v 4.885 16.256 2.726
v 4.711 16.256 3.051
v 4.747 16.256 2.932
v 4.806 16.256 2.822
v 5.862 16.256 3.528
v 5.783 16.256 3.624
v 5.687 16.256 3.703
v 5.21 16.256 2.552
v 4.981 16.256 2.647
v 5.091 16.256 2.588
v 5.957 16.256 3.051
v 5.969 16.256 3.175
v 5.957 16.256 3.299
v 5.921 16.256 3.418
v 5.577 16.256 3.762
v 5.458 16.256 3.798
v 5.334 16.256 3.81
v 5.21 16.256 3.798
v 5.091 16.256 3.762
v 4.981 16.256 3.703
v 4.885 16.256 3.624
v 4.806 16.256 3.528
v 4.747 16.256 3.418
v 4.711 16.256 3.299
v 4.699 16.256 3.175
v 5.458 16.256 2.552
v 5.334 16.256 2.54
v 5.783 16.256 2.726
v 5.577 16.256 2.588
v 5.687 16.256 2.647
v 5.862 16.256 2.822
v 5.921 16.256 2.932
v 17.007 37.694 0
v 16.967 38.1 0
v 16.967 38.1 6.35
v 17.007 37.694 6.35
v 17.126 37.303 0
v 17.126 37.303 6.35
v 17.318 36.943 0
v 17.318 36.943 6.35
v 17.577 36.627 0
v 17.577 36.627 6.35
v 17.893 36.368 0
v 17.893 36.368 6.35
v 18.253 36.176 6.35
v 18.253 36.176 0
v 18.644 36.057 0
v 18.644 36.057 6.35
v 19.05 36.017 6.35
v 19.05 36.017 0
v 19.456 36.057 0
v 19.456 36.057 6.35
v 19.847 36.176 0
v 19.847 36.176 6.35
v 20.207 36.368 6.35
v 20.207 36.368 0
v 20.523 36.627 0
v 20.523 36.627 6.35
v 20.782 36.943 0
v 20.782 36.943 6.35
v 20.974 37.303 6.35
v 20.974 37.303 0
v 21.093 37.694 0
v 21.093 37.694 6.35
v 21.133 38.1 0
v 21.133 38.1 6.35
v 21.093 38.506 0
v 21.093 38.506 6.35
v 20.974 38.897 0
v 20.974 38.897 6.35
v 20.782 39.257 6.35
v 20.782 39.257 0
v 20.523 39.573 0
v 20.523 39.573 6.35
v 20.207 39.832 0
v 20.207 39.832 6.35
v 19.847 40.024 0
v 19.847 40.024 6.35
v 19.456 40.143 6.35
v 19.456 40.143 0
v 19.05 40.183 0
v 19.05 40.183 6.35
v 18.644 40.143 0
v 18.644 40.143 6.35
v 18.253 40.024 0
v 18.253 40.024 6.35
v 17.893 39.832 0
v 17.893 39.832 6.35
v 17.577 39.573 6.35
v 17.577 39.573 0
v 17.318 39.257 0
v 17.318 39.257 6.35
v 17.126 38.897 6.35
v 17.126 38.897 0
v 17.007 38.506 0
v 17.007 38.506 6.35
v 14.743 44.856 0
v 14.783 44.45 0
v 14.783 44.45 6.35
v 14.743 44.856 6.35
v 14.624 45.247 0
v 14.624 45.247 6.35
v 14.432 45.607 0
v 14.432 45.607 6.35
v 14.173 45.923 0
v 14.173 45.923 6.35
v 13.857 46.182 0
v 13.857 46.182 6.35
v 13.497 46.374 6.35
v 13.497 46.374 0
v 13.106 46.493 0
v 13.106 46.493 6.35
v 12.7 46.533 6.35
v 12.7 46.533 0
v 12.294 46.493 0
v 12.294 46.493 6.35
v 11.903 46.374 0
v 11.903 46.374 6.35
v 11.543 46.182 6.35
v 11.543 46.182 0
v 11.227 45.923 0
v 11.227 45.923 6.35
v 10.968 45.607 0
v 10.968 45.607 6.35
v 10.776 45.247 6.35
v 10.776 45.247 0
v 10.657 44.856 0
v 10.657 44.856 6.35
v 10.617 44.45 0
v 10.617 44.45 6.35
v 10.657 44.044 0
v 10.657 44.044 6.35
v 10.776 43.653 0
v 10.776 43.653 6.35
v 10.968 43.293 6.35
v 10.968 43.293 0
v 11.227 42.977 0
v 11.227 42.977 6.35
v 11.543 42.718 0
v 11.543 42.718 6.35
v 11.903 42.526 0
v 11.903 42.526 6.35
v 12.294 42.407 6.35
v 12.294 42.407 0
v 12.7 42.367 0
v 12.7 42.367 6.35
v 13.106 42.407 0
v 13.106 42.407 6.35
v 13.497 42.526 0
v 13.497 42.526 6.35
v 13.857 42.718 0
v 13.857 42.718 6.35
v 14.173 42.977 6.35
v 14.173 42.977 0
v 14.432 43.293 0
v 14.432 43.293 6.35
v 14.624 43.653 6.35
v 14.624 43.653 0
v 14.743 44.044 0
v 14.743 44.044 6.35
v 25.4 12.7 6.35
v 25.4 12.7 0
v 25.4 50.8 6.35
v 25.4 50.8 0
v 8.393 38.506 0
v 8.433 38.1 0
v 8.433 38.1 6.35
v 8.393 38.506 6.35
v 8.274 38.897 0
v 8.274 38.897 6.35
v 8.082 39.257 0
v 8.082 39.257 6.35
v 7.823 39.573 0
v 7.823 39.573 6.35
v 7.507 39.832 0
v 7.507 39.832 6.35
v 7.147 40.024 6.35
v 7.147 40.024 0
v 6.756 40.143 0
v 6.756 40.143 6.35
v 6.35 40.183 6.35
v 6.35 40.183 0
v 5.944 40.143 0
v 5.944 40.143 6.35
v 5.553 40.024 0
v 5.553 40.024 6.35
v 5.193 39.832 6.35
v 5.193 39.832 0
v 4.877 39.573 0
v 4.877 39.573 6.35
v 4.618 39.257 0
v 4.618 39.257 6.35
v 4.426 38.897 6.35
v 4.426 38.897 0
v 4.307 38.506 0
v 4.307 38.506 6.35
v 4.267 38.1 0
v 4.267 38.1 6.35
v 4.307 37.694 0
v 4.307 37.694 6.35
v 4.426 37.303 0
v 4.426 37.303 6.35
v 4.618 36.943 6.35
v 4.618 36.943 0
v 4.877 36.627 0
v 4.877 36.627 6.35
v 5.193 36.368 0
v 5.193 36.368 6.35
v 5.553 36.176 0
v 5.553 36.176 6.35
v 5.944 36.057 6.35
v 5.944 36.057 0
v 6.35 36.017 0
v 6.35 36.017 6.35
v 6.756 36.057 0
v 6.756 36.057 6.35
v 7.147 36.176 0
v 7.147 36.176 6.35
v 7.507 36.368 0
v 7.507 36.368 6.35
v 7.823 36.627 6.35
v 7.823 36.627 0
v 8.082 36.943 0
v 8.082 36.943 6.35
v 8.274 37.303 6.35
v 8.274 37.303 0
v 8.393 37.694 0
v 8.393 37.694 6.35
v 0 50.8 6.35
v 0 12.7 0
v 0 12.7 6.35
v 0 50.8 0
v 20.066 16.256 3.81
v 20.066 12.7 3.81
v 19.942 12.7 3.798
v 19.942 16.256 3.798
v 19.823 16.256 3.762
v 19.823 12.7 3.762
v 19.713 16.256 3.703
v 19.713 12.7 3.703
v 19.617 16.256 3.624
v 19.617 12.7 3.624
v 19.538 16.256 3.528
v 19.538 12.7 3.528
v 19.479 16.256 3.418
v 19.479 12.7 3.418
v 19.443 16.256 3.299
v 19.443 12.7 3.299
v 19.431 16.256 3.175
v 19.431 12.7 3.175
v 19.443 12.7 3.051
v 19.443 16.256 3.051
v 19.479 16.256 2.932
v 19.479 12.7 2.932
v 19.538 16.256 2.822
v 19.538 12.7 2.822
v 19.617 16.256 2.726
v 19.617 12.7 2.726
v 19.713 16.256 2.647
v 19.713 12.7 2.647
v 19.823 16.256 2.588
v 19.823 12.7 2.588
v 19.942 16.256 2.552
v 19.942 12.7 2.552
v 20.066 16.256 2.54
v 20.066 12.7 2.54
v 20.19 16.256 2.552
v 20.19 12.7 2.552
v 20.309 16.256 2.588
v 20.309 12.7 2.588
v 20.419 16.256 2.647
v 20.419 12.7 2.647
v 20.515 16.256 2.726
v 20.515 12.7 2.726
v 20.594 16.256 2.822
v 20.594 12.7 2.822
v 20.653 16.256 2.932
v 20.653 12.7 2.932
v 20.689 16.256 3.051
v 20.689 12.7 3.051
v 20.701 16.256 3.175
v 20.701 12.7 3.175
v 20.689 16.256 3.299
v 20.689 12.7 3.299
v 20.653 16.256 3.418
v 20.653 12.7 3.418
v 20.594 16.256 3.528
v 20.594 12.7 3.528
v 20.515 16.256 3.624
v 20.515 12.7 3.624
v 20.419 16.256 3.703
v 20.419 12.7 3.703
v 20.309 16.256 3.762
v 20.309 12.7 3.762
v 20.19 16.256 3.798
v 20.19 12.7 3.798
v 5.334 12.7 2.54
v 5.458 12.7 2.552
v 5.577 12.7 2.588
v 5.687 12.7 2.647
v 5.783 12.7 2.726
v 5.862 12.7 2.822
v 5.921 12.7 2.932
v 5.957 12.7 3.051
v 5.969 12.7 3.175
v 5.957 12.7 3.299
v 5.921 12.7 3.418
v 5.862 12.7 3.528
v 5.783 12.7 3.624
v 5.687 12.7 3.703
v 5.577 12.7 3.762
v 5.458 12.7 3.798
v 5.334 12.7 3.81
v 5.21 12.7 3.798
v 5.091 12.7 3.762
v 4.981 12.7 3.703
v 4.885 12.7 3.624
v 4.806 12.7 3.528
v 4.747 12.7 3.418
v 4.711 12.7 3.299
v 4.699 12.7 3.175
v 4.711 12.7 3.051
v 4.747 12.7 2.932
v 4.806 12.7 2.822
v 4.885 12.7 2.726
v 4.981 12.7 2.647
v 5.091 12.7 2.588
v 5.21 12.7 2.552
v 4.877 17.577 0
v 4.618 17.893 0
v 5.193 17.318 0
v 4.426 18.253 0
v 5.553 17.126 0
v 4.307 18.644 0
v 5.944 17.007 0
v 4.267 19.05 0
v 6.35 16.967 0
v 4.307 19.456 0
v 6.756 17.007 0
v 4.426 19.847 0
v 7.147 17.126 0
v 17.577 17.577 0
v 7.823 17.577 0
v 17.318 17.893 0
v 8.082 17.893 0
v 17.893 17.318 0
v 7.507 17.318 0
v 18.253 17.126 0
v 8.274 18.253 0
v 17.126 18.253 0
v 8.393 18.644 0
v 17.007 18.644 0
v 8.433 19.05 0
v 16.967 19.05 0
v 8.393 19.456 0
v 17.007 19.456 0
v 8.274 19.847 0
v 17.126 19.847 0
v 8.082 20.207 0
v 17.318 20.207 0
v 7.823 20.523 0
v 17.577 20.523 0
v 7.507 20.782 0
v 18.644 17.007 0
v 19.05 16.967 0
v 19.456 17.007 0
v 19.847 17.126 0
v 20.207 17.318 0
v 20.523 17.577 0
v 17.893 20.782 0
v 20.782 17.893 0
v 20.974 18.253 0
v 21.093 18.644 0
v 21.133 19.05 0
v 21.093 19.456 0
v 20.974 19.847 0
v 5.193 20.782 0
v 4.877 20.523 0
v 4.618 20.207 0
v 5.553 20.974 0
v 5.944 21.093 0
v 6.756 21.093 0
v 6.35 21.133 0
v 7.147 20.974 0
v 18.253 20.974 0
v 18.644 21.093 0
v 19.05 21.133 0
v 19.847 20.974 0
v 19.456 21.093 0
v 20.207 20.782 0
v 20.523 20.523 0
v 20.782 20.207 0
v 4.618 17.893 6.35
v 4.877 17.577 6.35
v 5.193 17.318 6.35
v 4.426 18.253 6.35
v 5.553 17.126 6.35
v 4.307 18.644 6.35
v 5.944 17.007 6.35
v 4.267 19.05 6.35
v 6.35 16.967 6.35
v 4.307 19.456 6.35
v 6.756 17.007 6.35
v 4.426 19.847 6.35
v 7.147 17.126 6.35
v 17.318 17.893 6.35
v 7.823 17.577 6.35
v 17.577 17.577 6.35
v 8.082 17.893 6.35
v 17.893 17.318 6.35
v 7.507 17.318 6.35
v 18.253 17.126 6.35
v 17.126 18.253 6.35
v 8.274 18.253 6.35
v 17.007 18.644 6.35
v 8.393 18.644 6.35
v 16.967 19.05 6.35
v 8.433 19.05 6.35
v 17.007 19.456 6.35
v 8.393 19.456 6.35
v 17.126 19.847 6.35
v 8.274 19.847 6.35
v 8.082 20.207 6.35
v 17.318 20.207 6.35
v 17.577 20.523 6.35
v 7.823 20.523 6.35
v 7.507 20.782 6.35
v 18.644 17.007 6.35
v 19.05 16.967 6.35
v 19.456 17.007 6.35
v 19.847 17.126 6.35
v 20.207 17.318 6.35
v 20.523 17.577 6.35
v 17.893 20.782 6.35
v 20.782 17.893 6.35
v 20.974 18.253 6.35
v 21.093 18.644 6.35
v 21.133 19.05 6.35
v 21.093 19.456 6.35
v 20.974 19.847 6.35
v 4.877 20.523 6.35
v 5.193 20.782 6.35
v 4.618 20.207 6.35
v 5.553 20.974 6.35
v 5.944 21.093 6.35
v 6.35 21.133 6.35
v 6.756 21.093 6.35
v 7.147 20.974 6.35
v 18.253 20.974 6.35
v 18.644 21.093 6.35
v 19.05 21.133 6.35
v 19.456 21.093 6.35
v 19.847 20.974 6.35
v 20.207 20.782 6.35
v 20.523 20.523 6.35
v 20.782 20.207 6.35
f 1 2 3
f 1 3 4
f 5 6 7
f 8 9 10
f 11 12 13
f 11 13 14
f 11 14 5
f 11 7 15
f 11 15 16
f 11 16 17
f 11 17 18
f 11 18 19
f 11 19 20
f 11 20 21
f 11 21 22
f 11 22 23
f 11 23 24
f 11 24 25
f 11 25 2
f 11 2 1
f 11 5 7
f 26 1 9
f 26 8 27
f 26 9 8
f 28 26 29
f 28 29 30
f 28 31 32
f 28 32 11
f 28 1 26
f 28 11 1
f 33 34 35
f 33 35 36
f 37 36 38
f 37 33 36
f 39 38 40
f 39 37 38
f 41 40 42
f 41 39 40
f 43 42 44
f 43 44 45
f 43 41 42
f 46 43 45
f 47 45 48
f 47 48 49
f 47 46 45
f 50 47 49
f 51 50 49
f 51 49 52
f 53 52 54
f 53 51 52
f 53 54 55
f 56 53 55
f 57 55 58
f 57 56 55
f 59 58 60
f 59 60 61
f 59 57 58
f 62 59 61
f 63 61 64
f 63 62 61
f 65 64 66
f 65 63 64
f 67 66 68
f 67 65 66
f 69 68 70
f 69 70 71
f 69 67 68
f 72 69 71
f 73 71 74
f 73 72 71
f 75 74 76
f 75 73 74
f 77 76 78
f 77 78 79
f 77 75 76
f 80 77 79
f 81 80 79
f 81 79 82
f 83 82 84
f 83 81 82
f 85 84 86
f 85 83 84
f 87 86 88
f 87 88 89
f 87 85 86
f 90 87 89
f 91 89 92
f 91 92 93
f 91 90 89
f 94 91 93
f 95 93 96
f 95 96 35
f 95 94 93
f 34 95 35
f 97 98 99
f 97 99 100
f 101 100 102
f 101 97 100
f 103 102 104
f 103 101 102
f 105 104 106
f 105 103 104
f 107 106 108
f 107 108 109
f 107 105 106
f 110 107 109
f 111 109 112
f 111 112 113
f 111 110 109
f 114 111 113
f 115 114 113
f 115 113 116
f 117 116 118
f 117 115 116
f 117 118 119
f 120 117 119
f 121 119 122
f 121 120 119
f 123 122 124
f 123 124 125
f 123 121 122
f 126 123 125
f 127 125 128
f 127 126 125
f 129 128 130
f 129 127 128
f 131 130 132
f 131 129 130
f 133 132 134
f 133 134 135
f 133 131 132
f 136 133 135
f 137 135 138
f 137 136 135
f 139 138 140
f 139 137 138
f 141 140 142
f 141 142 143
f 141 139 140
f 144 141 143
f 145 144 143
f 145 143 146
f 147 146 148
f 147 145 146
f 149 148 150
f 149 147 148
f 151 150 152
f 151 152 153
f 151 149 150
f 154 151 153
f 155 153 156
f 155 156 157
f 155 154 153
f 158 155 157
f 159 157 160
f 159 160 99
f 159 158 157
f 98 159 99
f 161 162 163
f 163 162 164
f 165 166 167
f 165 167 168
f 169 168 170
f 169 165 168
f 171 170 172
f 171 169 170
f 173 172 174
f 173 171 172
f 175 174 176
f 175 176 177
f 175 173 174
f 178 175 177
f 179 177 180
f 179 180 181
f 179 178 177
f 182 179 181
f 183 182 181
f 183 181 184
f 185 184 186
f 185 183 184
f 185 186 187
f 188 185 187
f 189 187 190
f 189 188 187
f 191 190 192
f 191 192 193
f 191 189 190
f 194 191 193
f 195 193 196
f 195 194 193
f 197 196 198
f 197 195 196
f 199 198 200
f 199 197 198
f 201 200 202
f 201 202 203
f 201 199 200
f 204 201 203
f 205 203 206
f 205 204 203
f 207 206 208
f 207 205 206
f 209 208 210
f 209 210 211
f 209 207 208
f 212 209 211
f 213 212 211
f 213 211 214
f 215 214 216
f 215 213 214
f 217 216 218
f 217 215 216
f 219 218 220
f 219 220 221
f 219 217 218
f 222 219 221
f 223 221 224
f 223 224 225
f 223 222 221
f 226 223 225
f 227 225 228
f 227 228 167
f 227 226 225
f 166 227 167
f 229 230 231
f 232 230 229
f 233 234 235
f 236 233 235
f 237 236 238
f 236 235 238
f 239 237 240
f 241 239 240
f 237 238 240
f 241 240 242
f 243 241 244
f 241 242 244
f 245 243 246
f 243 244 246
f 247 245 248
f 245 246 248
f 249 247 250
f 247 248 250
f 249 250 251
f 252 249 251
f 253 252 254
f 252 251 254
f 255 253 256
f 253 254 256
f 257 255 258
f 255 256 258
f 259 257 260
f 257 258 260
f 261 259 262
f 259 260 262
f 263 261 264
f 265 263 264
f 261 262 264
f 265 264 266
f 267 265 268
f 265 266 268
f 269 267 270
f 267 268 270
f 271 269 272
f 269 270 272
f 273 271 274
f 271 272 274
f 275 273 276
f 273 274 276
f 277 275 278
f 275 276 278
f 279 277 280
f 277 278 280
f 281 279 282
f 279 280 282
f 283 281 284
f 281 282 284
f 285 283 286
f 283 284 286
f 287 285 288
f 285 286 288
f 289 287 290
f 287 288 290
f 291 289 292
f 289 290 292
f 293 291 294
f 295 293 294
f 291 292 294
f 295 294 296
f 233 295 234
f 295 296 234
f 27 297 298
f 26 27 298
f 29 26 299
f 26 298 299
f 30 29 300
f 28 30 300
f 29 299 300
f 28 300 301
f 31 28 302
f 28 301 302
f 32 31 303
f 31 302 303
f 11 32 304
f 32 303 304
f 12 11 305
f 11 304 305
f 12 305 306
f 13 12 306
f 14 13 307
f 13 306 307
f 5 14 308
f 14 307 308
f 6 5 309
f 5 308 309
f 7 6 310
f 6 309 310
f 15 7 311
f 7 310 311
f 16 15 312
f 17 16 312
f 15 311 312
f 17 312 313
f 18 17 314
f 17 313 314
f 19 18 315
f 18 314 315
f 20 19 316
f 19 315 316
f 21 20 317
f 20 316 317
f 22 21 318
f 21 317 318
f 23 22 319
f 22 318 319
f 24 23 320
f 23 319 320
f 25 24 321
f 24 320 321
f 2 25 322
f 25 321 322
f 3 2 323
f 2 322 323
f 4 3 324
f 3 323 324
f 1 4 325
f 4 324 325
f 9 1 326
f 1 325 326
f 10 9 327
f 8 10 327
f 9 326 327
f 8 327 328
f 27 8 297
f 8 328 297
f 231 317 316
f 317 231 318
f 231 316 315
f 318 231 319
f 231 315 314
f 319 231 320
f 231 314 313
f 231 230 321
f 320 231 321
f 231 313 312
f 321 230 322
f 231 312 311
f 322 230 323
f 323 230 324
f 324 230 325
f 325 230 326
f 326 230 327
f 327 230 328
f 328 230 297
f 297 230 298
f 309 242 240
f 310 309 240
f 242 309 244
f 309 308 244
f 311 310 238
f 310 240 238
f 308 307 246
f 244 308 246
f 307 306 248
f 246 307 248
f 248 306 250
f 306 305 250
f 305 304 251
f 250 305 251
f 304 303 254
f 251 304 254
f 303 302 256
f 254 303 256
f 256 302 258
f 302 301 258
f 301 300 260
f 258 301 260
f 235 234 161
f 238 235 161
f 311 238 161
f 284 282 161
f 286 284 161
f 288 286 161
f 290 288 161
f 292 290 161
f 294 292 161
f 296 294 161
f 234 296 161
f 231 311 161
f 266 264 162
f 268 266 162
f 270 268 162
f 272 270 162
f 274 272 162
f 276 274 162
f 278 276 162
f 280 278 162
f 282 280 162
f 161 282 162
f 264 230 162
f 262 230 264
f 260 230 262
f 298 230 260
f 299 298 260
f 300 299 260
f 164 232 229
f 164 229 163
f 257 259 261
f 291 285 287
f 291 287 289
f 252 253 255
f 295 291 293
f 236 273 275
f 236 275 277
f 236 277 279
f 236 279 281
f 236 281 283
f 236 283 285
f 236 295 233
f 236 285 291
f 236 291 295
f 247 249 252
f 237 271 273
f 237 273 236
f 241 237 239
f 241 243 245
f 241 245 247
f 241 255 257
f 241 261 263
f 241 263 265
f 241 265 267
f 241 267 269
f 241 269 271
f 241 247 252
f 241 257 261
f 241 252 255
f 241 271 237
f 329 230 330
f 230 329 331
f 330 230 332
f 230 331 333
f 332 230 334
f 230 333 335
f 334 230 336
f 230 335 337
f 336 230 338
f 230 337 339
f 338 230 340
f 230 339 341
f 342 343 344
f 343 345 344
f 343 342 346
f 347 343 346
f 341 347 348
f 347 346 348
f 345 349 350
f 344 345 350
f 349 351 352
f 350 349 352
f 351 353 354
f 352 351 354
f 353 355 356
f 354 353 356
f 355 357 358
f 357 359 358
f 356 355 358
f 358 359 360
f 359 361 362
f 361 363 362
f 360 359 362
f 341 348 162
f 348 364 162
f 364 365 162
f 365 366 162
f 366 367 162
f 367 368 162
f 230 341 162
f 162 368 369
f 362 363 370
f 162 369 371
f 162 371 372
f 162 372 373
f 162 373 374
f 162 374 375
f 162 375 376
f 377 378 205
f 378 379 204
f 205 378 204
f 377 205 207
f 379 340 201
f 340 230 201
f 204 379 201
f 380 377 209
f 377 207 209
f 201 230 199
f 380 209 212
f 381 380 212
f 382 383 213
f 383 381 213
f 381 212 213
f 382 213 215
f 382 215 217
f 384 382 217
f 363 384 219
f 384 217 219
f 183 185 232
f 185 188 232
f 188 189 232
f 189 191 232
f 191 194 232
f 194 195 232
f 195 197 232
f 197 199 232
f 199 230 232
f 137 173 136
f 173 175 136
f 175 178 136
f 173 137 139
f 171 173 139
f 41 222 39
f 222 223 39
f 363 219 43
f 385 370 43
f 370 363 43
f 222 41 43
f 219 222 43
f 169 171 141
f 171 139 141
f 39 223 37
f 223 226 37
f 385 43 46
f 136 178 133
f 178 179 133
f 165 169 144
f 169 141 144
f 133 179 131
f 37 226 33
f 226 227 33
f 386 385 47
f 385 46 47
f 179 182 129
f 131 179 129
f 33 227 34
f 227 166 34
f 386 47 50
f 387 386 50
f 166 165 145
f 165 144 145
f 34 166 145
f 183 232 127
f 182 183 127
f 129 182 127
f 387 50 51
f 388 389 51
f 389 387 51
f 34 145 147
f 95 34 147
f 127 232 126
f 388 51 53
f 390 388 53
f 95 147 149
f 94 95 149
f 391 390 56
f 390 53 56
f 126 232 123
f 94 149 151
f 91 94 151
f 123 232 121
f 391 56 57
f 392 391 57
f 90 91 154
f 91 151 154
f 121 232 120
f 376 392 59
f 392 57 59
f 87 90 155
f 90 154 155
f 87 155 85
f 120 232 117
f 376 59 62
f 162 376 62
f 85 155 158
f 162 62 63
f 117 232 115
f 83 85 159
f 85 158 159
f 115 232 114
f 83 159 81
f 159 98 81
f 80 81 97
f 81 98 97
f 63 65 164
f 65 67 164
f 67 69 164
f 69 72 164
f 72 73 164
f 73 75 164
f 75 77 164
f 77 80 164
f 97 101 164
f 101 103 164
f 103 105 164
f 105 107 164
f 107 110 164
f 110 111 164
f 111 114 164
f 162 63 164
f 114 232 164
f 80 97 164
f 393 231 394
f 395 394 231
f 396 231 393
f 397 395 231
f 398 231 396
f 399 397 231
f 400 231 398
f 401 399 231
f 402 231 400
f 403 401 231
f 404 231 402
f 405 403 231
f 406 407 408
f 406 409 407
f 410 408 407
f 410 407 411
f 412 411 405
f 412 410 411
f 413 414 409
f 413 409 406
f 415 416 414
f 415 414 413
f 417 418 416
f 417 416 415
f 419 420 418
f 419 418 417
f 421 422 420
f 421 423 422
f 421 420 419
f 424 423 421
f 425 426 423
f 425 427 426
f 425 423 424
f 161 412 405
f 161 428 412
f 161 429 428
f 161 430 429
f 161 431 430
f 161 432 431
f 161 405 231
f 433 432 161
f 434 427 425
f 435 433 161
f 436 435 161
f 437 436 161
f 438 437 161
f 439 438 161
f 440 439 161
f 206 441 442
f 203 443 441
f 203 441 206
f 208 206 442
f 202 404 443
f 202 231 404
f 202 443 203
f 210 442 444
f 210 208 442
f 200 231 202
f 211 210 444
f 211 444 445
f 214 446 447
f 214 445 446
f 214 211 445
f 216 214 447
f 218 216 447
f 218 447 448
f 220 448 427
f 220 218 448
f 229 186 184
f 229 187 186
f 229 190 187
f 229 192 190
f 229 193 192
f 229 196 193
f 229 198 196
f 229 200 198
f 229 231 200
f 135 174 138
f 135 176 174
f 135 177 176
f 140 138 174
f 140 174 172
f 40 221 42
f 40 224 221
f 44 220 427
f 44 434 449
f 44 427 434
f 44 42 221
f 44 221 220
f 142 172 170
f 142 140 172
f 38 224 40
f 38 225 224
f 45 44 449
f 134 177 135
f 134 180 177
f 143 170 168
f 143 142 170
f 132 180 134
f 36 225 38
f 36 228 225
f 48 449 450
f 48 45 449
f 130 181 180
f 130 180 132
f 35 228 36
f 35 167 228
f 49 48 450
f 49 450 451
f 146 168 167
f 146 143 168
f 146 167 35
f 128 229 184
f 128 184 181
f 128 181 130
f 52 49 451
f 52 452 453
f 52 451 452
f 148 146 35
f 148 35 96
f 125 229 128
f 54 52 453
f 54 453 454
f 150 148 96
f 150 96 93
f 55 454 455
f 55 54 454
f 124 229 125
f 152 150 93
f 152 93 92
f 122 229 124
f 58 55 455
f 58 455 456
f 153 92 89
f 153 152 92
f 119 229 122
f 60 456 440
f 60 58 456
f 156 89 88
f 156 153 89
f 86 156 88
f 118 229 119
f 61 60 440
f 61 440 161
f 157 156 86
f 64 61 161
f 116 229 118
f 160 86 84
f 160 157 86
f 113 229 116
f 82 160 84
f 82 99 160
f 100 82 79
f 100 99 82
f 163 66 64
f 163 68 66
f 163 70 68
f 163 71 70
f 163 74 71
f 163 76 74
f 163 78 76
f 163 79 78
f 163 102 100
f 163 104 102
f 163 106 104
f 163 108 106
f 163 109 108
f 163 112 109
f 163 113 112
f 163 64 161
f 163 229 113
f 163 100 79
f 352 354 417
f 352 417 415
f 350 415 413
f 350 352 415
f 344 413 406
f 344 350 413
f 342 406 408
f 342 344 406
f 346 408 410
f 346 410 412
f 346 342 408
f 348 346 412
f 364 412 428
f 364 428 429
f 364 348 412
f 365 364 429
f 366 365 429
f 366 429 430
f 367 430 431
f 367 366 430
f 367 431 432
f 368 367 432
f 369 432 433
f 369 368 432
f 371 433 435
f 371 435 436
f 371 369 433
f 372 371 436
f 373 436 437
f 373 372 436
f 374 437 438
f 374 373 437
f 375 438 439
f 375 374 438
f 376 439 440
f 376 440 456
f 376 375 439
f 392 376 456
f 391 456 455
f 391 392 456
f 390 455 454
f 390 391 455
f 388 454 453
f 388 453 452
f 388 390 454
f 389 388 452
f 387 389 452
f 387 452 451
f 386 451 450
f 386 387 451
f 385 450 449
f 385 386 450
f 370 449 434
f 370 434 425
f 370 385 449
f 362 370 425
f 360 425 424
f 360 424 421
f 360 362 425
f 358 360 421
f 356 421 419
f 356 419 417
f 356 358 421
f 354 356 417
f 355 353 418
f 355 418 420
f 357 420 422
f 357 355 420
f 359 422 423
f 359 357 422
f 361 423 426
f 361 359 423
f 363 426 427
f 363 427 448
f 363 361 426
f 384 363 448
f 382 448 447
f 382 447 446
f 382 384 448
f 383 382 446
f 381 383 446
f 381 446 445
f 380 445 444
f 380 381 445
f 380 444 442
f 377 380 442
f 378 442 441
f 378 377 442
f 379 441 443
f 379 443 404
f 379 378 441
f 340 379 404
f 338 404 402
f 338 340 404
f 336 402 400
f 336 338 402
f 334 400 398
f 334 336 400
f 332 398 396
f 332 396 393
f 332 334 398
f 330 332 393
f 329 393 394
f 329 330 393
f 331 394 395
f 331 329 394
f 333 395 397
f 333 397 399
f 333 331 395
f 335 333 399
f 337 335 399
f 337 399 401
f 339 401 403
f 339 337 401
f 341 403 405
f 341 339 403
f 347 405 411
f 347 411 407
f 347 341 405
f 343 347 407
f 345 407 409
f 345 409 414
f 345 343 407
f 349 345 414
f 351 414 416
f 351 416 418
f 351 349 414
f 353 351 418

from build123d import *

# Parameters (mm, degrees)
SKETCH1_W           = 25.4
SKETCH1_H           = 38.1
SKETCH1_R           = 2.0828
BOSS_EXTRUDE1_DEPTH = 6.35
SKETCH2_R           = 0.635
CUT_EXTRUDE1_DEPTH  = 3.556


with BuildPart() as part:
    # Sketch1 → Boss-Extrude1 (new body)
    with BuildSketch(Plane.XY):
        with Locations((12.7, 31.75)):
            Rectangle(SKETCH1_W, SKETCH1_H)
        with Locations((6.35, 19.05)):
            Circle(SKETCH1_R, mode=Mode.SUBTRACT)
        with Locations((6.35, 38.1)):
            Circle(SKETCH1_R, mode=Mode.SUBTRACT)
        with Locations((12.7, 44.45)):
            Circle(SKETCH1_R, mode=Mode.SUBTRACT)
        with Locations(Location((19.05, 19.05, 0), (0, 0, 180))):
            Circle(SKETCH1_R, mode=Mode.SUBTRACT)
        with Locations(Location((19.05, 38.1, 0), (0, 0, 180))):
            Circle(SKETCH1_R, mode=Mode.SUBTRACT)
    extrude(amount=BOSS_EXTRUDE1_DEPTH)

    # Sketch2 → Cut-Extrude1 (cut)
    with BuildSketch(Plane.XZ.offset(-12.7)):
        with Locations(Location((5.334, 3.175, 0), (0, 0, 270))):
            Circle(SKETCH2_R)
        with Locations(Location((20.066, 3.175, 0), (0, 0, 90))):
            Circle(SKETCH2_R)
    extrude(amount=-CUT_EXTRUDE1_DEPTH, mode=Mode.SUBTRACT)


solid = part.part
